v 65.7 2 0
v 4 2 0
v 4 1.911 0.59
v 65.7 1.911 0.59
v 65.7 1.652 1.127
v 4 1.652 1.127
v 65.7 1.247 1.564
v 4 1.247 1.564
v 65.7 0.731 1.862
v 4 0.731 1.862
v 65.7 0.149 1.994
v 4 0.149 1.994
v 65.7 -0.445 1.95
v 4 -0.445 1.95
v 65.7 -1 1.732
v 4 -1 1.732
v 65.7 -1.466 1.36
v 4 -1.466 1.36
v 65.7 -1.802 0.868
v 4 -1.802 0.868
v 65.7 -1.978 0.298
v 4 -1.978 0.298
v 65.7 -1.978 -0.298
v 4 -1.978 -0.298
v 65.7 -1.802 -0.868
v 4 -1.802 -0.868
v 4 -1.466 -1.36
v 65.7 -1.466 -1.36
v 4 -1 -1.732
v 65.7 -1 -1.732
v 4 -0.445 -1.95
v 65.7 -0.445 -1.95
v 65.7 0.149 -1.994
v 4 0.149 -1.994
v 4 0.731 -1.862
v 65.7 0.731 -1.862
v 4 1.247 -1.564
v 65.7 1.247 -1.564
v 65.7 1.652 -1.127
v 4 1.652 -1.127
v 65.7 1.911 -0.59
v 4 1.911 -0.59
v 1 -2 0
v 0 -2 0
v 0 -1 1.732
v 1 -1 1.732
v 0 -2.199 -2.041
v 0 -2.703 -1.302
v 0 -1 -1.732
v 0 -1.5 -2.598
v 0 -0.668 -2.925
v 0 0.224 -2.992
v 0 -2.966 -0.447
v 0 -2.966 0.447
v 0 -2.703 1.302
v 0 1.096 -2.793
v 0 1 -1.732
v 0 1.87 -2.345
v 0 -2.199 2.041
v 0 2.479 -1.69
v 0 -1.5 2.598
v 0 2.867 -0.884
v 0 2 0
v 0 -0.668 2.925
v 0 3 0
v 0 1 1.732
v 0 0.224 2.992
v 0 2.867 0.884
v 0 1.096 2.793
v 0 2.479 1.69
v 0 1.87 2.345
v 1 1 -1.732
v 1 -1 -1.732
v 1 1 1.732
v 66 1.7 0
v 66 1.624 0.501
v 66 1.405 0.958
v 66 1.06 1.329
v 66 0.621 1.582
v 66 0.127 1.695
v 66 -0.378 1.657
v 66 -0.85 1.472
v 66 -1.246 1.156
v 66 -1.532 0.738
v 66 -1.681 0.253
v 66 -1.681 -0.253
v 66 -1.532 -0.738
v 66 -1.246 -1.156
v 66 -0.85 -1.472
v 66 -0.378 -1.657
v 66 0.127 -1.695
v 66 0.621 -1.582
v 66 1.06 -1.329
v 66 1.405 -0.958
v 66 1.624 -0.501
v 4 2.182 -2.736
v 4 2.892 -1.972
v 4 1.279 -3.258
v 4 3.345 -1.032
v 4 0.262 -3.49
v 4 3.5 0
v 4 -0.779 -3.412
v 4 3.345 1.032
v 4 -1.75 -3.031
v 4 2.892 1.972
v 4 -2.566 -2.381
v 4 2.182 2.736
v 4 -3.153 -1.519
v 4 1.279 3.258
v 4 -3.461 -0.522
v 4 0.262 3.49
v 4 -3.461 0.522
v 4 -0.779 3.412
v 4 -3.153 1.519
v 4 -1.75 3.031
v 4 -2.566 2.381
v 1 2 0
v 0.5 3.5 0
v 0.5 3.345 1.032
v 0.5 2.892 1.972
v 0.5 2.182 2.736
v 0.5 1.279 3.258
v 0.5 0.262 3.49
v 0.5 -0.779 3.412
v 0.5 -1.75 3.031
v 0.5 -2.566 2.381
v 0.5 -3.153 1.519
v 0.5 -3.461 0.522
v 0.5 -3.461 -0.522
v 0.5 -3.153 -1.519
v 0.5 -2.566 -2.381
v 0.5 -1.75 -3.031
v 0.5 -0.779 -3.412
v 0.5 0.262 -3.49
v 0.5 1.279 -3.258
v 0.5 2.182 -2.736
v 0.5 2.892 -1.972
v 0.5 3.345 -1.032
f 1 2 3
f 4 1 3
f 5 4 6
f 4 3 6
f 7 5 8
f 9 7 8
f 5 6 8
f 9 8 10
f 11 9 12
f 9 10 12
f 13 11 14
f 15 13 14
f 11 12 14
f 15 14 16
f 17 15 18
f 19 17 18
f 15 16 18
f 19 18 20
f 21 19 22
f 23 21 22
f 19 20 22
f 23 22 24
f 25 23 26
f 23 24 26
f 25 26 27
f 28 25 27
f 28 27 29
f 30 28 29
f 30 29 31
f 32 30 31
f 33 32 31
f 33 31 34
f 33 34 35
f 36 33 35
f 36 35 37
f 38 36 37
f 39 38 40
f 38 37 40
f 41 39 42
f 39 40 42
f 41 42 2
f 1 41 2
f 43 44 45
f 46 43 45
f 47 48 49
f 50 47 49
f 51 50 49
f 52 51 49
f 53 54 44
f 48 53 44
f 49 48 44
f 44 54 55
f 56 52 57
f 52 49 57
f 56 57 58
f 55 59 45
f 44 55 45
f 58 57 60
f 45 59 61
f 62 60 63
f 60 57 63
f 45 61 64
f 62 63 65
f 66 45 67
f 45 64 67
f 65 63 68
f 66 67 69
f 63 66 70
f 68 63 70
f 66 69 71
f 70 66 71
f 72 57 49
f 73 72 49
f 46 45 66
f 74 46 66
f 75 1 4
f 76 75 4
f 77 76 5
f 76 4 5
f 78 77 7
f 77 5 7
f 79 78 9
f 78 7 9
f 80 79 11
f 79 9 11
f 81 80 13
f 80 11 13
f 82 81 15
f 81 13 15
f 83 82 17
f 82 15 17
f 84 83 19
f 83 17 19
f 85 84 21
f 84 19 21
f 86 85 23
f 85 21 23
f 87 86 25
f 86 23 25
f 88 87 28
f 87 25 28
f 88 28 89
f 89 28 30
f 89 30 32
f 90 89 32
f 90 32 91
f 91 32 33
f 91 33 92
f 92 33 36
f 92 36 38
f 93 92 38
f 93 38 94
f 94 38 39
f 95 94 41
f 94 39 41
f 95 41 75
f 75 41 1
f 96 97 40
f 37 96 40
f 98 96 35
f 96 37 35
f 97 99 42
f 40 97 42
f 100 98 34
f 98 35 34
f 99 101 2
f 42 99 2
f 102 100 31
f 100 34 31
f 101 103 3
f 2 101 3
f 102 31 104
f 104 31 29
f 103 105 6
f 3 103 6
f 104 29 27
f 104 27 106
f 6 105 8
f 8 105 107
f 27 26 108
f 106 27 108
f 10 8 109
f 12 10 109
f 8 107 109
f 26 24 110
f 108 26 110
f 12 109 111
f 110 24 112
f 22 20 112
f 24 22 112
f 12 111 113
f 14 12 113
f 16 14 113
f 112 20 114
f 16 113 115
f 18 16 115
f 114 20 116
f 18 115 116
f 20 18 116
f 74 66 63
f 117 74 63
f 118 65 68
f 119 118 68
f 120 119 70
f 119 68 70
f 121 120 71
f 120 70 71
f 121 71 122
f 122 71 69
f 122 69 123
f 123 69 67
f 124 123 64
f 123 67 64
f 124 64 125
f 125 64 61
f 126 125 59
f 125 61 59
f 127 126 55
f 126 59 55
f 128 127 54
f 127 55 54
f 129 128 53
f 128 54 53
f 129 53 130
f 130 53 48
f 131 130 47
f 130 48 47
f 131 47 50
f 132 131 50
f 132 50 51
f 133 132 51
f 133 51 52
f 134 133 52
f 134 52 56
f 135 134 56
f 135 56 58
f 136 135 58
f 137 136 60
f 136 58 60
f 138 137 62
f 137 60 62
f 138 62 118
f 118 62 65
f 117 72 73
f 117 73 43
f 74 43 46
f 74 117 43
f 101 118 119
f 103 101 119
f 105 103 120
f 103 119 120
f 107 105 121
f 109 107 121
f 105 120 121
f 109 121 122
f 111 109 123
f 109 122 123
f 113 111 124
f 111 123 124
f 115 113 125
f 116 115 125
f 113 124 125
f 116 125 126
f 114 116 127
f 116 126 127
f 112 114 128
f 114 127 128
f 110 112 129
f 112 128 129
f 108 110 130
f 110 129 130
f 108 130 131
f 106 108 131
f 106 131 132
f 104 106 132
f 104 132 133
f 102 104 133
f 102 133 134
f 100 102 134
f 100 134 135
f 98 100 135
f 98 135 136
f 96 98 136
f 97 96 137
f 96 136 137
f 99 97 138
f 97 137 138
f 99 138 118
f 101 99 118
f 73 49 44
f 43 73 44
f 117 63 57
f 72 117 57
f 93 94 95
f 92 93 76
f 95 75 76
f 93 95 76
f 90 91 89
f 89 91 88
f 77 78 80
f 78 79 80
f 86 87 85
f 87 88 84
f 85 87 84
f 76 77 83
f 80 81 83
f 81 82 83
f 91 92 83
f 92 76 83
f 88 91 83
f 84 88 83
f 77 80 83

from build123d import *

# Parameters (mm, degrees)
CHAMFER1_SIZE      = 0.3
CUT_EXTRUDE1_DEPTH = 1
CHAMFER2_SIZE      = 0.5


with BuildPart() as part:
    # Sketch1 → Revolve1 (revolve)
    with BuildSketch(Plane.XY):
        Polygon((0, 0), (66, 0), (66, 2), (4, 2), (4, 3.5), (0, 3.5), align=None)
    revolve(axis=Axis((0, 0, 0), (1, 0, 0)))

    # Chamfer1
    chamfer1_edges = [part.edges().sort_by_distance(p)[0] for p in [
        (66, -2, 0),
    ]]
    chamfer(chamfer1_edges, length=CHAMFER1_SIZE)

    # Sketch2 → Cut-Extrude1 (cut)
    with BuildSketch(Plane.ZY):
        Polygon((0, 2), (-1.732050808, 1), (-1.732050808, -1), (0, -2), (1.732050808, -1), (1.732050808, 1), align=None)
    extrude(amount=-CUT_EXTRUDE1_DEPTH, mode=Mode.SUBTRACT)

    # Chamfer2
    chamfer2_edges = [part.edges().sort_by_distance(p)[0] for p in [
        (0, -3.5, 0),
    ]]
    chamfer(chamfer2_edges, length=CHAMFER2_SIZE)


solid = part.part
